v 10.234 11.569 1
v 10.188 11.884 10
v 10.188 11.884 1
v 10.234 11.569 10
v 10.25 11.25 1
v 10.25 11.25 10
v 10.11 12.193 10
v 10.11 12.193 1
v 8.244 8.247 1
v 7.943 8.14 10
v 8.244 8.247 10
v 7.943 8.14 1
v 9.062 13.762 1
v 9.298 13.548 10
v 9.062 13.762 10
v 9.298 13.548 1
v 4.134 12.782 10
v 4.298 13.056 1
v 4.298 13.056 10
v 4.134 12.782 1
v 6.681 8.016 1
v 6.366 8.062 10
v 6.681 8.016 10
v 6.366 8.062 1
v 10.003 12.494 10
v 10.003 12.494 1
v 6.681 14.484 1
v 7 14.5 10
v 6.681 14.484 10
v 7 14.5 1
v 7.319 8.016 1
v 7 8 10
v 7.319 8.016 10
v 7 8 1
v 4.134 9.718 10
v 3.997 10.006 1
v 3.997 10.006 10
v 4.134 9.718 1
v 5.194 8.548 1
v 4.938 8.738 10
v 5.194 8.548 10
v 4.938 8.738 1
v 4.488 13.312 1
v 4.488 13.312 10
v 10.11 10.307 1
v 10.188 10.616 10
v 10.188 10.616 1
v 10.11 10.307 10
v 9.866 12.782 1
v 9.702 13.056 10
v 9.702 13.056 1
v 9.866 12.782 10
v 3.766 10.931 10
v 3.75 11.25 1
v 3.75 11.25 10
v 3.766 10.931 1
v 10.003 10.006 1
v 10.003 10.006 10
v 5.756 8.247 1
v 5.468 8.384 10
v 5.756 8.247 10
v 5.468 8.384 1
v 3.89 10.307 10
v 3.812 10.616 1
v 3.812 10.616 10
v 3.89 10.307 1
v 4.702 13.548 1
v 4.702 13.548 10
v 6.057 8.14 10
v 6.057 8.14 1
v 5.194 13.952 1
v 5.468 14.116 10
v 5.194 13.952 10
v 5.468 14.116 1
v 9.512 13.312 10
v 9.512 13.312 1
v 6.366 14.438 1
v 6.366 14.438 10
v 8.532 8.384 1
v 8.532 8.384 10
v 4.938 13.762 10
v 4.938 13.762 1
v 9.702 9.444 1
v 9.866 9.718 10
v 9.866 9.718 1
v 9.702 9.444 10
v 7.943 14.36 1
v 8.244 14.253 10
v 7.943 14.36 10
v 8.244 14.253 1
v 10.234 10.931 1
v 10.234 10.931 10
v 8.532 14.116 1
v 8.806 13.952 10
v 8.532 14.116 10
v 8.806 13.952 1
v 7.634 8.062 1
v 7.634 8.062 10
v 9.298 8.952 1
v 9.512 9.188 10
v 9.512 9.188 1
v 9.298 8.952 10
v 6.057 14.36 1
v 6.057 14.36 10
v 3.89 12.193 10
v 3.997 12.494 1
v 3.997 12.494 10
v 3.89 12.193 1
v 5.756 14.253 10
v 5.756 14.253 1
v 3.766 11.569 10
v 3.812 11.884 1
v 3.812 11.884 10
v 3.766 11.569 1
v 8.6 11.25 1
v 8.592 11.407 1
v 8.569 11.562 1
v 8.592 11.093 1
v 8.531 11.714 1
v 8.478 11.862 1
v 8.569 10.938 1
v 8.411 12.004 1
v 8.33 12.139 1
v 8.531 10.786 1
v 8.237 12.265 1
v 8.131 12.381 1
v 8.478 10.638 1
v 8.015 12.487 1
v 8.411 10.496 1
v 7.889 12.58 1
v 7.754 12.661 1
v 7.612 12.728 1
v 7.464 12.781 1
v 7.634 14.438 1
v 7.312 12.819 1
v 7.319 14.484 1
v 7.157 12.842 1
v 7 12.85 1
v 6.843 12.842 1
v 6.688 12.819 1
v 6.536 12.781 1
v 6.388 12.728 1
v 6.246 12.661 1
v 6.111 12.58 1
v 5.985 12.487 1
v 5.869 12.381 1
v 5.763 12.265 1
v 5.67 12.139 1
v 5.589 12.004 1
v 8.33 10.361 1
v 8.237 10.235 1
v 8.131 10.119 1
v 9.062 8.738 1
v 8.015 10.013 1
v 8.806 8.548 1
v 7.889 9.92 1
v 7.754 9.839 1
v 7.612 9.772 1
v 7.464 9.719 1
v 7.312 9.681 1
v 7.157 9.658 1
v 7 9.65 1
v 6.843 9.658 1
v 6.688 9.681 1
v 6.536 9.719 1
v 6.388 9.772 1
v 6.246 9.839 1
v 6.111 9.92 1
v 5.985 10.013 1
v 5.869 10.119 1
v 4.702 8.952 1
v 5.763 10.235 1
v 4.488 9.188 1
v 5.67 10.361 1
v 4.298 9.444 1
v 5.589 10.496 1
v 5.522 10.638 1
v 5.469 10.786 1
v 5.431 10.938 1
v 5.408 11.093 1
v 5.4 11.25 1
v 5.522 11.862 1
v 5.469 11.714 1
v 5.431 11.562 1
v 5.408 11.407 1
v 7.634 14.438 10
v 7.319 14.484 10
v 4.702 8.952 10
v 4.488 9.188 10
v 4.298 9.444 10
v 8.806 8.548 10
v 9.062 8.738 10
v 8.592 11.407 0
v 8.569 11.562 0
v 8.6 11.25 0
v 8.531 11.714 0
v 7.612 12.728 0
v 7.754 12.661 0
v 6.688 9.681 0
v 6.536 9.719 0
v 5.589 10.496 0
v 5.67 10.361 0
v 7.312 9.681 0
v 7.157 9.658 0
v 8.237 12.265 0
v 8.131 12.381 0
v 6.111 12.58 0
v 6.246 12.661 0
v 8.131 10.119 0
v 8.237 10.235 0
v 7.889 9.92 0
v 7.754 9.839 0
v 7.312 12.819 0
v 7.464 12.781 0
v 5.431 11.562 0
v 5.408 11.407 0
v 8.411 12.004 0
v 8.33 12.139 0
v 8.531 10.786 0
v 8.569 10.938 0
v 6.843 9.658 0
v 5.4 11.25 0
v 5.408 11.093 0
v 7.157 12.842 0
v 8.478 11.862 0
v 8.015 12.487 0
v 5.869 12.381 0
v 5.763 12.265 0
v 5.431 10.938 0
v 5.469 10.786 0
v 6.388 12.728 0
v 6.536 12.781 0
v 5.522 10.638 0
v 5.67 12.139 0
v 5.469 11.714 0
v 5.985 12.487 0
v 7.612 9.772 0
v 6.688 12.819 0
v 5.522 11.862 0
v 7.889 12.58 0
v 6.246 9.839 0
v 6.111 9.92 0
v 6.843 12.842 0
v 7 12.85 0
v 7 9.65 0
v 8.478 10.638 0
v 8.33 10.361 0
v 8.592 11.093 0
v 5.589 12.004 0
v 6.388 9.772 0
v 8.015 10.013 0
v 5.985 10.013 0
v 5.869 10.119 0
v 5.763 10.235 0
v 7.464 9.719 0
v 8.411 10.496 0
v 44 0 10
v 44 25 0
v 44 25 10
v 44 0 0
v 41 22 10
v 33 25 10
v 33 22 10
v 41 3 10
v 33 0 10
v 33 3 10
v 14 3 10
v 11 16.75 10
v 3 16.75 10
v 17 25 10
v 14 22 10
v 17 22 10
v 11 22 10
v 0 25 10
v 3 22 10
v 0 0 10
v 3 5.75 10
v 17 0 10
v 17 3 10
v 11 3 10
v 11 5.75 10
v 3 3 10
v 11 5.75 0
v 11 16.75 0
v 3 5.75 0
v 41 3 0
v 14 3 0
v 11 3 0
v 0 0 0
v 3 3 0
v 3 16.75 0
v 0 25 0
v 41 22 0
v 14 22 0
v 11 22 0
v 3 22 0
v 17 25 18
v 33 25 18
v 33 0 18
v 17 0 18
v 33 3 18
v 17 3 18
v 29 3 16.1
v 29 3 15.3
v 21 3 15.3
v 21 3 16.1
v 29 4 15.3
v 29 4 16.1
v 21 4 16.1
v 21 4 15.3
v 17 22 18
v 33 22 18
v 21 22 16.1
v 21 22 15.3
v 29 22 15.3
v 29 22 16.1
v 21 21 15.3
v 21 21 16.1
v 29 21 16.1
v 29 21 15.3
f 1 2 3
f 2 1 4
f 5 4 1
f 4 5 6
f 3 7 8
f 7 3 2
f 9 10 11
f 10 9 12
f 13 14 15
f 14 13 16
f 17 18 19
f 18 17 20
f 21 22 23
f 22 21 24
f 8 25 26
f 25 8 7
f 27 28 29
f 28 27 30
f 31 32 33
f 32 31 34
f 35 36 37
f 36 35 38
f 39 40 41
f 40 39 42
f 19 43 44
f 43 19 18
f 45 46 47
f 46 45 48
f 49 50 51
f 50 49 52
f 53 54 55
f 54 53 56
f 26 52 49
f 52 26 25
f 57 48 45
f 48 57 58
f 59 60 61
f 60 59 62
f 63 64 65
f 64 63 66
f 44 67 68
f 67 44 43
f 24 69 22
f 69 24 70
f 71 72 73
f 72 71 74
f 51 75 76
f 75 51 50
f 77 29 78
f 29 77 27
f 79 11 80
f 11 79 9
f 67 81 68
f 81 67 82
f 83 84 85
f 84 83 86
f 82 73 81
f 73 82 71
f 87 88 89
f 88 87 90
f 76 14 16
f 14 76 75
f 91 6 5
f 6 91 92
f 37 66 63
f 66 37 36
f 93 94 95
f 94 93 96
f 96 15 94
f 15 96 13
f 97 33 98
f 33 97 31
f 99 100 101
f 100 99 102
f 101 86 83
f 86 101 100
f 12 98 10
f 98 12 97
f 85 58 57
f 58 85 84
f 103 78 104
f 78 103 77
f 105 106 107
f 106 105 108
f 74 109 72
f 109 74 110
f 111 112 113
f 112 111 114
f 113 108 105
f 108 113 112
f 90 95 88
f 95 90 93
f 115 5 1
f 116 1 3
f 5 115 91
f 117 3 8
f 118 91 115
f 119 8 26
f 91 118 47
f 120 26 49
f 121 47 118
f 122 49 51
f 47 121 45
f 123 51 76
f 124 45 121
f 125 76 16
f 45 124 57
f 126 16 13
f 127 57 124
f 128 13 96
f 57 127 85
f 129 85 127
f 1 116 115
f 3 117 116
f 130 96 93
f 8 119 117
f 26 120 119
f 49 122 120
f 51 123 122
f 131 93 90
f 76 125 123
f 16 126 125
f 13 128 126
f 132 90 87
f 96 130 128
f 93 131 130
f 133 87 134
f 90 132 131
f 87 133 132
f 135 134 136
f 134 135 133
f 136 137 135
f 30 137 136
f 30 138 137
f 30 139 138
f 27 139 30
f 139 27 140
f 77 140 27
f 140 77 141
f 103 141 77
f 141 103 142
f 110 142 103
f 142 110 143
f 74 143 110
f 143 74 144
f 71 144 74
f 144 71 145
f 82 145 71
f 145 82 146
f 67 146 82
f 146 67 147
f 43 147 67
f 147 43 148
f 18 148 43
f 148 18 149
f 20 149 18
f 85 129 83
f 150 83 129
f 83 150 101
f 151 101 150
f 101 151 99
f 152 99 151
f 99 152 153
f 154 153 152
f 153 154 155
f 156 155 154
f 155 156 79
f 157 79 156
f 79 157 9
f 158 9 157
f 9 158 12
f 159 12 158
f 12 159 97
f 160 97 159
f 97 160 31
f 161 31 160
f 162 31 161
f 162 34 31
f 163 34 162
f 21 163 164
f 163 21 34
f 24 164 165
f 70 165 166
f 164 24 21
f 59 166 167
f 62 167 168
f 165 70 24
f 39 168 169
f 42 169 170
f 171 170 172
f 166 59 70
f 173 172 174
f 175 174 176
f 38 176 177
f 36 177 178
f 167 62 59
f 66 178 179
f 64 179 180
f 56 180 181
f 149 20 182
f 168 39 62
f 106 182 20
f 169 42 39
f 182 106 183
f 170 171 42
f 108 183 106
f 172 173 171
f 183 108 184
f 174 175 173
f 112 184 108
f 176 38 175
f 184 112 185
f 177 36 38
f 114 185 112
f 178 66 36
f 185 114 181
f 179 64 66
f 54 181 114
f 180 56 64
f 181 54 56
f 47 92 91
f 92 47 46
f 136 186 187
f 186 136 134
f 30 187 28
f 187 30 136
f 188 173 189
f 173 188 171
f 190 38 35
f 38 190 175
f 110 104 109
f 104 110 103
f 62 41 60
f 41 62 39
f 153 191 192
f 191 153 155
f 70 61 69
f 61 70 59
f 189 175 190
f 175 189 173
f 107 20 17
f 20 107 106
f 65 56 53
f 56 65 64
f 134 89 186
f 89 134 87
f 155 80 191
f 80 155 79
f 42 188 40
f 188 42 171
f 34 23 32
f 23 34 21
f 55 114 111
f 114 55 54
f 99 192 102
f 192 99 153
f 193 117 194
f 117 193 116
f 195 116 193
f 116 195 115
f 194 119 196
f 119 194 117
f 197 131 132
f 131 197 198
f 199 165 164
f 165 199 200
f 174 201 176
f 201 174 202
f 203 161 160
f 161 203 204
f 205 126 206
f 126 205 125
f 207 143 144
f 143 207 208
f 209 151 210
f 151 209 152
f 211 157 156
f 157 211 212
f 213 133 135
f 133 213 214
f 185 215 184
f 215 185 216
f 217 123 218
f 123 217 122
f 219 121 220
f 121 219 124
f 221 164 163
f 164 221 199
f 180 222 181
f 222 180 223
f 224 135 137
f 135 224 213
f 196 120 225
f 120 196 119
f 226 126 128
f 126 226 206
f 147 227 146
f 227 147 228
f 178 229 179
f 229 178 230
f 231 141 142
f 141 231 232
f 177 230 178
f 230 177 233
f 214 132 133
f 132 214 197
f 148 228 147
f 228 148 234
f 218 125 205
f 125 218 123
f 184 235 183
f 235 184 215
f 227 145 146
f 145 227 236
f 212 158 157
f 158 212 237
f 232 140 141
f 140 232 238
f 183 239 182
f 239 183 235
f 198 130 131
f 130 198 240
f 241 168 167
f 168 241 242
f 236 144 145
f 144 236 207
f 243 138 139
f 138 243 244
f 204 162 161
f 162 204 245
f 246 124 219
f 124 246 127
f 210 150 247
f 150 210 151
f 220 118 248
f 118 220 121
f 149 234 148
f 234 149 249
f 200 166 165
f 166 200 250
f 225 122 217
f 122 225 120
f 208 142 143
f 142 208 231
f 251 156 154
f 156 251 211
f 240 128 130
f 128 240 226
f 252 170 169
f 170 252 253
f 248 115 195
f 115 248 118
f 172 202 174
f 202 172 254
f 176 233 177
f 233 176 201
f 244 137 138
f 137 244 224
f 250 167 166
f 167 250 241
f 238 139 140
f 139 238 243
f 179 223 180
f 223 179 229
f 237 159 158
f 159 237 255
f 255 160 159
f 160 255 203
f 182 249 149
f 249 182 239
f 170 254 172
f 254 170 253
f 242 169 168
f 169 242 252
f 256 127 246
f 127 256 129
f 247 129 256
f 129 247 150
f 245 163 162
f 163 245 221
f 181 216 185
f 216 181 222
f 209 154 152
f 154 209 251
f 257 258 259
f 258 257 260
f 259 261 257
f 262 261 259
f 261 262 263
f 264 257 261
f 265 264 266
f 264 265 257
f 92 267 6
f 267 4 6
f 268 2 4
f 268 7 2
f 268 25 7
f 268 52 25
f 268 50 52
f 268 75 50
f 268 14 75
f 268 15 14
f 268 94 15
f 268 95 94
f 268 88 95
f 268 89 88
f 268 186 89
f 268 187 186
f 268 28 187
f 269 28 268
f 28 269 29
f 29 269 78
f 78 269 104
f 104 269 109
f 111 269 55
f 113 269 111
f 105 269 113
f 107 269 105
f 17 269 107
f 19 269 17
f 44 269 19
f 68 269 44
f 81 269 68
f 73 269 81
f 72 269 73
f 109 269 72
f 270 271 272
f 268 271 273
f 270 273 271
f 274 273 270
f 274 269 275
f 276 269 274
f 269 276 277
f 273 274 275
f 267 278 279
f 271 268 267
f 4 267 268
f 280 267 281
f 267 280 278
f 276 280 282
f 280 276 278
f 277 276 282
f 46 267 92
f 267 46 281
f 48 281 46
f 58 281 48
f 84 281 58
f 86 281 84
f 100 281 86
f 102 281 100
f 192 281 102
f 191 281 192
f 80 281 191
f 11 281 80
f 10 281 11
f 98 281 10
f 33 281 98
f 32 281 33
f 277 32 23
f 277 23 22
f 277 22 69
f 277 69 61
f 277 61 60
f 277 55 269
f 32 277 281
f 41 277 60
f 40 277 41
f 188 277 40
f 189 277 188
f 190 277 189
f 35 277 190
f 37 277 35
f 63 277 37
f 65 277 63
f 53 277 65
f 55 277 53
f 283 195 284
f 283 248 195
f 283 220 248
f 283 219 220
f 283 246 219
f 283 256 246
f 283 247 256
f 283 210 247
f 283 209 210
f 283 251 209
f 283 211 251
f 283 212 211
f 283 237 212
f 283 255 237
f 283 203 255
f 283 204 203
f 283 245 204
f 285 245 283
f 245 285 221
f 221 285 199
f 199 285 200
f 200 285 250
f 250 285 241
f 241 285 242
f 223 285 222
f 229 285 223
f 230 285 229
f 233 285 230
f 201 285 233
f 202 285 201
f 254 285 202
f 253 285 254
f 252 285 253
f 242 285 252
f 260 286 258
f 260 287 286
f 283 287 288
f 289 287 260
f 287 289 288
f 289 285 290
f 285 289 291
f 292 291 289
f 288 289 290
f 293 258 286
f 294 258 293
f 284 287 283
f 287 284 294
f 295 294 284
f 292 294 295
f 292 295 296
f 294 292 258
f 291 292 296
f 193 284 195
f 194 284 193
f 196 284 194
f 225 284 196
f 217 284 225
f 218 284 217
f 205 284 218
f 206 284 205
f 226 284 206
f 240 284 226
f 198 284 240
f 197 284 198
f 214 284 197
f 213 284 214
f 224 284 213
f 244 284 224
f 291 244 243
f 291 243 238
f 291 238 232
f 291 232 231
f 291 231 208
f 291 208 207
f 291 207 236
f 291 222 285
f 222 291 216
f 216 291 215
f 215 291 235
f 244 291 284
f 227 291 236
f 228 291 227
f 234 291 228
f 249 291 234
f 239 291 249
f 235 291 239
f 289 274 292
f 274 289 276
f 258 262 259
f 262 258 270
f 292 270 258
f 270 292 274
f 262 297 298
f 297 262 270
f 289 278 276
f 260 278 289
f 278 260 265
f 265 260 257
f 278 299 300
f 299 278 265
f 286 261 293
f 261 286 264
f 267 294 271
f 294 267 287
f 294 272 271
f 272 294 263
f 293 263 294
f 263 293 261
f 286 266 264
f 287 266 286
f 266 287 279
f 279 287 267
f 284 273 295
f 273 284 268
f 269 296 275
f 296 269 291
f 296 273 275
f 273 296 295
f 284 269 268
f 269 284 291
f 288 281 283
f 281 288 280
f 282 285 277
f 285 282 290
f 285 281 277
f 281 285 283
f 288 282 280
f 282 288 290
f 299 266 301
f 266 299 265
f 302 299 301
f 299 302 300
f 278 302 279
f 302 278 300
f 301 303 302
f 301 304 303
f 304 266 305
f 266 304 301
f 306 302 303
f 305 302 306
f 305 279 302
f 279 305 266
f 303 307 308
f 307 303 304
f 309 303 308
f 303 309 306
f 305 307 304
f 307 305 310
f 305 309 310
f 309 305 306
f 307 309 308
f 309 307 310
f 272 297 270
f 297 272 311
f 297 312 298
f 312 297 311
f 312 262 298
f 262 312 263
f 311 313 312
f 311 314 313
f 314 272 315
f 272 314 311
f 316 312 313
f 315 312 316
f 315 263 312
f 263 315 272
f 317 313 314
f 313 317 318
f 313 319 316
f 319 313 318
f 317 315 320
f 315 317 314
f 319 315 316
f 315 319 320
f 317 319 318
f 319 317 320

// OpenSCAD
$fn=64;
CLIP_HEIGHT=3;
CLIP_NOTCH_WIDTH=10;
BASE_HEIGHT=19+2*CLIP_HEIGHT;
BASE_WIDTH=44;
BASE_DEPTH=10;
LED_X=7;
LED_RADIUS=6.5/2;

clip_width=CLIP_NOTCH_WIDTH+2*CLIP_HEIGHT;


module base(){
    cube([BASE_WIDTH,BASE_HEIGHT,BASE_DEPTH]);
}

module cutout(){
    cutout_width=BASE_WIDTH-2*LED_X-CLIP_HEIGHT;
    translate([BASE_WIDTH-cutout_width-CLIP_HEIGHT,CLIP_HEIGHT,-1])
    cube([cutout_width,BASE_HEIGHT-CLIP_HEIGHT*2,BASE_DEPTH+2]);
}

module cutout_small_top(){
    cutout_width=2*LED_X-2*CLIP_HEIGHT;
    cutout_height=LED_X-CLIP_HEIGHT+1.25;
    translate([CLIP_HEIGHT,BASE_HEIGHT-CLIP_HEIGHT-cutout_height,-1])
    cube([cutout_width,cutout_height,BASE_DEPTH+2]);
}


module cutout_small_bottom(){
    cutout_width=2*LED_X-2*CLIP_HEIGHT;
    cutout_height=LED_X-CLIP_HEIGHT-1.25;
    translate([CLIP_HEIGHT,CLIP_HEIGHT,-1])
    cube([cutout_width,cutout_height,BASE_DEPTH+2]);
}

module led(){
    translate([LED_X,(BASE_HEIGHT)/2-1.25,0]){
        translate([0,0,1]) cylinder(r=LED_RADIUS,h=BASE_DEPTH);
        translate([0,0,-1]) cylinder(d=3.2,h=3);
    }
}

module clip_base(){
    width_tolerance=1;
    depth_tolerance=.1;
    cube([clip_width,CLIP_HEIGHT,8]);
    translate([(clip_width-CLIP_NOTCH_WIDTH)/2+width_tolerance,0,5+3*depth_tolerance])
        cube([CLIP_NOTCH_WIDTH-2*width_tolerance,CLIP_HEIGHT+1,1-2*depth_tolerance]);
}

module clip(orientation){
    if (orientation=="front") {
        translate([20-CLIP_HEIGHT,0,BASE_DEPTH])
            clip_base();
    }
    if (orientation=="back") {
        translate([20-CLIP_HEIGHT+clip_width,BASE_HEIGHT,BASE_DEPTH])
            rotate([0,0,180])
                clip_base();
    }
}

union(){
    difference(){
        base();
        cutout();
        cutout_small_top();
        cutout_small_bottom();
        led();
    }
    clip("front");
    clip("back");
}
